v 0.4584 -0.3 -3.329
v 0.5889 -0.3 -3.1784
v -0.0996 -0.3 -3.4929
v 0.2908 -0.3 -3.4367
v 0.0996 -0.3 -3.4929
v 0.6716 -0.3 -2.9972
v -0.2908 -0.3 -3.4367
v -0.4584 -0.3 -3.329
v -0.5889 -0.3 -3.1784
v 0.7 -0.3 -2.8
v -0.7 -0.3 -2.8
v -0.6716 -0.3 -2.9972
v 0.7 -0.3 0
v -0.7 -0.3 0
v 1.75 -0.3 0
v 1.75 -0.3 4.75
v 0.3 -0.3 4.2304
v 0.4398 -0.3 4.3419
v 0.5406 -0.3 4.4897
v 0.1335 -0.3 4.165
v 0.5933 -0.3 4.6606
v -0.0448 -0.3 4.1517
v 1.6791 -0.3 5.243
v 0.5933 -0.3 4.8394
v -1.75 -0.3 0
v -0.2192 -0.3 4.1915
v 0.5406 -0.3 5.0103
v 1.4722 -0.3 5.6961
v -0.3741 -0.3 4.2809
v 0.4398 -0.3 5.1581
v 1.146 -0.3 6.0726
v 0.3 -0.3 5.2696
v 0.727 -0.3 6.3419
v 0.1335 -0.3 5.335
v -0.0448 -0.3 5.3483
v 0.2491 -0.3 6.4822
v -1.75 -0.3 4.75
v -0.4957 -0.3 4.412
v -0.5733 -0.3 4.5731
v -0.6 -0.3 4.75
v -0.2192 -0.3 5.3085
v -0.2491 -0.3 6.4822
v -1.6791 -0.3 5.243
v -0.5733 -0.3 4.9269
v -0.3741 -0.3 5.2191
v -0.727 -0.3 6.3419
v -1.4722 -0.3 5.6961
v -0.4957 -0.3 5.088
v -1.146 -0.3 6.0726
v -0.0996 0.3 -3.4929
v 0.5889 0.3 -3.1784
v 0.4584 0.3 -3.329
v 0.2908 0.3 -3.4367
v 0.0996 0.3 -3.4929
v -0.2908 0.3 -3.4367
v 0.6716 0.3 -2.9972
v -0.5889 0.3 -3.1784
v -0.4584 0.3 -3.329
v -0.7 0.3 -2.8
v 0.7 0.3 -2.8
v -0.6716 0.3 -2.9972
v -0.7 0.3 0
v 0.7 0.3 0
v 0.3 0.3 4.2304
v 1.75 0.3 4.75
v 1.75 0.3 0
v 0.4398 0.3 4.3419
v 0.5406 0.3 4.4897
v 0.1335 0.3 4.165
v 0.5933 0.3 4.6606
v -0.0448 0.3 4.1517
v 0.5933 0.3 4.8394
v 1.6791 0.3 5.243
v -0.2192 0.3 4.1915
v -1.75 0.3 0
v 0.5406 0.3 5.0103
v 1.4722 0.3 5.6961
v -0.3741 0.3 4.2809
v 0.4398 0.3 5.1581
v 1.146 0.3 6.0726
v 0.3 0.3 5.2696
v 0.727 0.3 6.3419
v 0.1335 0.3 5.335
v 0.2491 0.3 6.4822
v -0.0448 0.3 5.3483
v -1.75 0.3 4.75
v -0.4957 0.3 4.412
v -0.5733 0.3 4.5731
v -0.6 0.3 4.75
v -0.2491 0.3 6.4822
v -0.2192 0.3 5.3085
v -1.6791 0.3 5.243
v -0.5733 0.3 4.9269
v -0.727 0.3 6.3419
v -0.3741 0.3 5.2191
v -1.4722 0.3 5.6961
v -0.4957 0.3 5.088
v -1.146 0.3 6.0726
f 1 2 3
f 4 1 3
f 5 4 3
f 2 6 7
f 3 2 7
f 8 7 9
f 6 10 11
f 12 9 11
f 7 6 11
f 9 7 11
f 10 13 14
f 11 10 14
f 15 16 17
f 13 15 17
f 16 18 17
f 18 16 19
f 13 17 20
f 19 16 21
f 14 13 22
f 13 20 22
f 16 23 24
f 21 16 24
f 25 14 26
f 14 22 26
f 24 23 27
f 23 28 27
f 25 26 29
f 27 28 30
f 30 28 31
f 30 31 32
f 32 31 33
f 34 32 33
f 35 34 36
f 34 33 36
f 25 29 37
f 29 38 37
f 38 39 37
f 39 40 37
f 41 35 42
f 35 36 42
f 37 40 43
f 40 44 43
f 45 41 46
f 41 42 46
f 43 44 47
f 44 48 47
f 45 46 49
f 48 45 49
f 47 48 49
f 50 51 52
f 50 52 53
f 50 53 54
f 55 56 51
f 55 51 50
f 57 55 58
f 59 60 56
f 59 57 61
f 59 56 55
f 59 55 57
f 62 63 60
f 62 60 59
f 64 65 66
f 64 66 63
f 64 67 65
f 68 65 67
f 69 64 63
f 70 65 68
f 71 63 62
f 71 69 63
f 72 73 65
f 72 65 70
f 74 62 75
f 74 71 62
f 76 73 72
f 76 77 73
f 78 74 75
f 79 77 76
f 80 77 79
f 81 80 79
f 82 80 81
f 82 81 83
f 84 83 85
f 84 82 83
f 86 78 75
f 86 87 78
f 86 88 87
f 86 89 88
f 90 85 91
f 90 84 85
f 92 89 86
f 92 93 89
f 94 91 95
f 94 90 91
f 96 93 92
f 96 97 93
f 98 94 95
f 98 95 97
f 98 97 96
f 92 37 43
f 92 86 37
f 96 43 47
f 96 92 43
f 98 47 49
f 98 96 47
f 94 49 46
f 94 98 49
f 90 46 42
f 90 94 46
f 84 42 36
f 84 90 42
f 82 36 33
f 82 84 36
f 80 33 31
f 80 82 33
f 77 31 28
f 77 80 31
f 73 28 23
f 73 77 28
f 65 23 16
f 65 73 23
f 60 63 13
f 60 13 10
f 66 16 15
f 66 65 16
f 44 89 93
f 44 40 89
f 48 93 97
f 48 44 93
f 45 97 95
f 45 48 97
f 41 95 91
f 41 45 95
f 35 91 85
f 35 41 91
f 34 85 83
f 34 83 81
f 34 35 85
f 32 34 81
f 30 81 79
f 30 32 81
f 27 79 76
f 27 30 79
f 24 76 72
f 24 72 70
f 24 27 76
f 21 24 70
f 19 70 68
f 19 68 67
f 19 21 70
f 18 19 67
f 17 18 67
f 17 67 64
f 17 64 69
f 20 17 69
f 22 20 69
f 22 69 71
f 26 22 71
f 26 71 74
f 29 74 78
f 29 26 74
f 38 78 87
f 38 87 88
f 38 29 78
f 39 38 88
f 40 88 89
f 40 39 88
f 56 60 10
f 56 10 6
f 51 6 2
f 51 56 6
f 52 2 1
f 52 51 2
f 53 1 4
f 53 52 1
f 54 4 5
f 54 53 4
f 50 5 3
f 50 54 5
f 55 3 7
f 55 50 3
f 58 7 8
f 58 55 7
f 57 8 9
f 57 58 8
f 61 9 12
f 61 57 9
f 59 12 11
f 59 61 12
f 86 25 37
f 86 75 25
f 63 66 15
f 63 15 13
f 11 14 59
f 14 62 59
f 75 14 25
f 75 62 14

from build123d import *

# Parameters (mm, degrees)
SKETCH_R  = 0.6
PAD_DEPTH = 0.3


with BuildPart() as part:
    # Sketch → Pad (new body, symmetric)
    with BuildSketch(Plane(origin=(0, 0, 0), x_dir=(-1, 0, 0), z_dir=(0, 1, 0))):
        with BuildLine():
            Line((-1.75, 4.75), (-1.75, 0))
            Line((-1.75, 0), (-0.7, 0))
            Line((-0.7, 0), (-0.7, -2.8))
            ThreePointArc((-0.7, -2.8), (0, -3.5), (0.7, -2.8))
            Line((0.7, 0), (0.7, -2.8))
            Line((0.7, 0), (1.75, 0))
            Line((1.75, 0), (1.75, 4.75))
            ThreePointArc((1.75, 4.75), (0, 6.5), (-1.75, 4.75))
        make_face()
        with Locations((0, 4.75)):
            Circle(SKETCH_R, mode=Mode.SUBTRACT)
    extrude(amount=PAD_DEPTH, both=True)


solid = part.part
